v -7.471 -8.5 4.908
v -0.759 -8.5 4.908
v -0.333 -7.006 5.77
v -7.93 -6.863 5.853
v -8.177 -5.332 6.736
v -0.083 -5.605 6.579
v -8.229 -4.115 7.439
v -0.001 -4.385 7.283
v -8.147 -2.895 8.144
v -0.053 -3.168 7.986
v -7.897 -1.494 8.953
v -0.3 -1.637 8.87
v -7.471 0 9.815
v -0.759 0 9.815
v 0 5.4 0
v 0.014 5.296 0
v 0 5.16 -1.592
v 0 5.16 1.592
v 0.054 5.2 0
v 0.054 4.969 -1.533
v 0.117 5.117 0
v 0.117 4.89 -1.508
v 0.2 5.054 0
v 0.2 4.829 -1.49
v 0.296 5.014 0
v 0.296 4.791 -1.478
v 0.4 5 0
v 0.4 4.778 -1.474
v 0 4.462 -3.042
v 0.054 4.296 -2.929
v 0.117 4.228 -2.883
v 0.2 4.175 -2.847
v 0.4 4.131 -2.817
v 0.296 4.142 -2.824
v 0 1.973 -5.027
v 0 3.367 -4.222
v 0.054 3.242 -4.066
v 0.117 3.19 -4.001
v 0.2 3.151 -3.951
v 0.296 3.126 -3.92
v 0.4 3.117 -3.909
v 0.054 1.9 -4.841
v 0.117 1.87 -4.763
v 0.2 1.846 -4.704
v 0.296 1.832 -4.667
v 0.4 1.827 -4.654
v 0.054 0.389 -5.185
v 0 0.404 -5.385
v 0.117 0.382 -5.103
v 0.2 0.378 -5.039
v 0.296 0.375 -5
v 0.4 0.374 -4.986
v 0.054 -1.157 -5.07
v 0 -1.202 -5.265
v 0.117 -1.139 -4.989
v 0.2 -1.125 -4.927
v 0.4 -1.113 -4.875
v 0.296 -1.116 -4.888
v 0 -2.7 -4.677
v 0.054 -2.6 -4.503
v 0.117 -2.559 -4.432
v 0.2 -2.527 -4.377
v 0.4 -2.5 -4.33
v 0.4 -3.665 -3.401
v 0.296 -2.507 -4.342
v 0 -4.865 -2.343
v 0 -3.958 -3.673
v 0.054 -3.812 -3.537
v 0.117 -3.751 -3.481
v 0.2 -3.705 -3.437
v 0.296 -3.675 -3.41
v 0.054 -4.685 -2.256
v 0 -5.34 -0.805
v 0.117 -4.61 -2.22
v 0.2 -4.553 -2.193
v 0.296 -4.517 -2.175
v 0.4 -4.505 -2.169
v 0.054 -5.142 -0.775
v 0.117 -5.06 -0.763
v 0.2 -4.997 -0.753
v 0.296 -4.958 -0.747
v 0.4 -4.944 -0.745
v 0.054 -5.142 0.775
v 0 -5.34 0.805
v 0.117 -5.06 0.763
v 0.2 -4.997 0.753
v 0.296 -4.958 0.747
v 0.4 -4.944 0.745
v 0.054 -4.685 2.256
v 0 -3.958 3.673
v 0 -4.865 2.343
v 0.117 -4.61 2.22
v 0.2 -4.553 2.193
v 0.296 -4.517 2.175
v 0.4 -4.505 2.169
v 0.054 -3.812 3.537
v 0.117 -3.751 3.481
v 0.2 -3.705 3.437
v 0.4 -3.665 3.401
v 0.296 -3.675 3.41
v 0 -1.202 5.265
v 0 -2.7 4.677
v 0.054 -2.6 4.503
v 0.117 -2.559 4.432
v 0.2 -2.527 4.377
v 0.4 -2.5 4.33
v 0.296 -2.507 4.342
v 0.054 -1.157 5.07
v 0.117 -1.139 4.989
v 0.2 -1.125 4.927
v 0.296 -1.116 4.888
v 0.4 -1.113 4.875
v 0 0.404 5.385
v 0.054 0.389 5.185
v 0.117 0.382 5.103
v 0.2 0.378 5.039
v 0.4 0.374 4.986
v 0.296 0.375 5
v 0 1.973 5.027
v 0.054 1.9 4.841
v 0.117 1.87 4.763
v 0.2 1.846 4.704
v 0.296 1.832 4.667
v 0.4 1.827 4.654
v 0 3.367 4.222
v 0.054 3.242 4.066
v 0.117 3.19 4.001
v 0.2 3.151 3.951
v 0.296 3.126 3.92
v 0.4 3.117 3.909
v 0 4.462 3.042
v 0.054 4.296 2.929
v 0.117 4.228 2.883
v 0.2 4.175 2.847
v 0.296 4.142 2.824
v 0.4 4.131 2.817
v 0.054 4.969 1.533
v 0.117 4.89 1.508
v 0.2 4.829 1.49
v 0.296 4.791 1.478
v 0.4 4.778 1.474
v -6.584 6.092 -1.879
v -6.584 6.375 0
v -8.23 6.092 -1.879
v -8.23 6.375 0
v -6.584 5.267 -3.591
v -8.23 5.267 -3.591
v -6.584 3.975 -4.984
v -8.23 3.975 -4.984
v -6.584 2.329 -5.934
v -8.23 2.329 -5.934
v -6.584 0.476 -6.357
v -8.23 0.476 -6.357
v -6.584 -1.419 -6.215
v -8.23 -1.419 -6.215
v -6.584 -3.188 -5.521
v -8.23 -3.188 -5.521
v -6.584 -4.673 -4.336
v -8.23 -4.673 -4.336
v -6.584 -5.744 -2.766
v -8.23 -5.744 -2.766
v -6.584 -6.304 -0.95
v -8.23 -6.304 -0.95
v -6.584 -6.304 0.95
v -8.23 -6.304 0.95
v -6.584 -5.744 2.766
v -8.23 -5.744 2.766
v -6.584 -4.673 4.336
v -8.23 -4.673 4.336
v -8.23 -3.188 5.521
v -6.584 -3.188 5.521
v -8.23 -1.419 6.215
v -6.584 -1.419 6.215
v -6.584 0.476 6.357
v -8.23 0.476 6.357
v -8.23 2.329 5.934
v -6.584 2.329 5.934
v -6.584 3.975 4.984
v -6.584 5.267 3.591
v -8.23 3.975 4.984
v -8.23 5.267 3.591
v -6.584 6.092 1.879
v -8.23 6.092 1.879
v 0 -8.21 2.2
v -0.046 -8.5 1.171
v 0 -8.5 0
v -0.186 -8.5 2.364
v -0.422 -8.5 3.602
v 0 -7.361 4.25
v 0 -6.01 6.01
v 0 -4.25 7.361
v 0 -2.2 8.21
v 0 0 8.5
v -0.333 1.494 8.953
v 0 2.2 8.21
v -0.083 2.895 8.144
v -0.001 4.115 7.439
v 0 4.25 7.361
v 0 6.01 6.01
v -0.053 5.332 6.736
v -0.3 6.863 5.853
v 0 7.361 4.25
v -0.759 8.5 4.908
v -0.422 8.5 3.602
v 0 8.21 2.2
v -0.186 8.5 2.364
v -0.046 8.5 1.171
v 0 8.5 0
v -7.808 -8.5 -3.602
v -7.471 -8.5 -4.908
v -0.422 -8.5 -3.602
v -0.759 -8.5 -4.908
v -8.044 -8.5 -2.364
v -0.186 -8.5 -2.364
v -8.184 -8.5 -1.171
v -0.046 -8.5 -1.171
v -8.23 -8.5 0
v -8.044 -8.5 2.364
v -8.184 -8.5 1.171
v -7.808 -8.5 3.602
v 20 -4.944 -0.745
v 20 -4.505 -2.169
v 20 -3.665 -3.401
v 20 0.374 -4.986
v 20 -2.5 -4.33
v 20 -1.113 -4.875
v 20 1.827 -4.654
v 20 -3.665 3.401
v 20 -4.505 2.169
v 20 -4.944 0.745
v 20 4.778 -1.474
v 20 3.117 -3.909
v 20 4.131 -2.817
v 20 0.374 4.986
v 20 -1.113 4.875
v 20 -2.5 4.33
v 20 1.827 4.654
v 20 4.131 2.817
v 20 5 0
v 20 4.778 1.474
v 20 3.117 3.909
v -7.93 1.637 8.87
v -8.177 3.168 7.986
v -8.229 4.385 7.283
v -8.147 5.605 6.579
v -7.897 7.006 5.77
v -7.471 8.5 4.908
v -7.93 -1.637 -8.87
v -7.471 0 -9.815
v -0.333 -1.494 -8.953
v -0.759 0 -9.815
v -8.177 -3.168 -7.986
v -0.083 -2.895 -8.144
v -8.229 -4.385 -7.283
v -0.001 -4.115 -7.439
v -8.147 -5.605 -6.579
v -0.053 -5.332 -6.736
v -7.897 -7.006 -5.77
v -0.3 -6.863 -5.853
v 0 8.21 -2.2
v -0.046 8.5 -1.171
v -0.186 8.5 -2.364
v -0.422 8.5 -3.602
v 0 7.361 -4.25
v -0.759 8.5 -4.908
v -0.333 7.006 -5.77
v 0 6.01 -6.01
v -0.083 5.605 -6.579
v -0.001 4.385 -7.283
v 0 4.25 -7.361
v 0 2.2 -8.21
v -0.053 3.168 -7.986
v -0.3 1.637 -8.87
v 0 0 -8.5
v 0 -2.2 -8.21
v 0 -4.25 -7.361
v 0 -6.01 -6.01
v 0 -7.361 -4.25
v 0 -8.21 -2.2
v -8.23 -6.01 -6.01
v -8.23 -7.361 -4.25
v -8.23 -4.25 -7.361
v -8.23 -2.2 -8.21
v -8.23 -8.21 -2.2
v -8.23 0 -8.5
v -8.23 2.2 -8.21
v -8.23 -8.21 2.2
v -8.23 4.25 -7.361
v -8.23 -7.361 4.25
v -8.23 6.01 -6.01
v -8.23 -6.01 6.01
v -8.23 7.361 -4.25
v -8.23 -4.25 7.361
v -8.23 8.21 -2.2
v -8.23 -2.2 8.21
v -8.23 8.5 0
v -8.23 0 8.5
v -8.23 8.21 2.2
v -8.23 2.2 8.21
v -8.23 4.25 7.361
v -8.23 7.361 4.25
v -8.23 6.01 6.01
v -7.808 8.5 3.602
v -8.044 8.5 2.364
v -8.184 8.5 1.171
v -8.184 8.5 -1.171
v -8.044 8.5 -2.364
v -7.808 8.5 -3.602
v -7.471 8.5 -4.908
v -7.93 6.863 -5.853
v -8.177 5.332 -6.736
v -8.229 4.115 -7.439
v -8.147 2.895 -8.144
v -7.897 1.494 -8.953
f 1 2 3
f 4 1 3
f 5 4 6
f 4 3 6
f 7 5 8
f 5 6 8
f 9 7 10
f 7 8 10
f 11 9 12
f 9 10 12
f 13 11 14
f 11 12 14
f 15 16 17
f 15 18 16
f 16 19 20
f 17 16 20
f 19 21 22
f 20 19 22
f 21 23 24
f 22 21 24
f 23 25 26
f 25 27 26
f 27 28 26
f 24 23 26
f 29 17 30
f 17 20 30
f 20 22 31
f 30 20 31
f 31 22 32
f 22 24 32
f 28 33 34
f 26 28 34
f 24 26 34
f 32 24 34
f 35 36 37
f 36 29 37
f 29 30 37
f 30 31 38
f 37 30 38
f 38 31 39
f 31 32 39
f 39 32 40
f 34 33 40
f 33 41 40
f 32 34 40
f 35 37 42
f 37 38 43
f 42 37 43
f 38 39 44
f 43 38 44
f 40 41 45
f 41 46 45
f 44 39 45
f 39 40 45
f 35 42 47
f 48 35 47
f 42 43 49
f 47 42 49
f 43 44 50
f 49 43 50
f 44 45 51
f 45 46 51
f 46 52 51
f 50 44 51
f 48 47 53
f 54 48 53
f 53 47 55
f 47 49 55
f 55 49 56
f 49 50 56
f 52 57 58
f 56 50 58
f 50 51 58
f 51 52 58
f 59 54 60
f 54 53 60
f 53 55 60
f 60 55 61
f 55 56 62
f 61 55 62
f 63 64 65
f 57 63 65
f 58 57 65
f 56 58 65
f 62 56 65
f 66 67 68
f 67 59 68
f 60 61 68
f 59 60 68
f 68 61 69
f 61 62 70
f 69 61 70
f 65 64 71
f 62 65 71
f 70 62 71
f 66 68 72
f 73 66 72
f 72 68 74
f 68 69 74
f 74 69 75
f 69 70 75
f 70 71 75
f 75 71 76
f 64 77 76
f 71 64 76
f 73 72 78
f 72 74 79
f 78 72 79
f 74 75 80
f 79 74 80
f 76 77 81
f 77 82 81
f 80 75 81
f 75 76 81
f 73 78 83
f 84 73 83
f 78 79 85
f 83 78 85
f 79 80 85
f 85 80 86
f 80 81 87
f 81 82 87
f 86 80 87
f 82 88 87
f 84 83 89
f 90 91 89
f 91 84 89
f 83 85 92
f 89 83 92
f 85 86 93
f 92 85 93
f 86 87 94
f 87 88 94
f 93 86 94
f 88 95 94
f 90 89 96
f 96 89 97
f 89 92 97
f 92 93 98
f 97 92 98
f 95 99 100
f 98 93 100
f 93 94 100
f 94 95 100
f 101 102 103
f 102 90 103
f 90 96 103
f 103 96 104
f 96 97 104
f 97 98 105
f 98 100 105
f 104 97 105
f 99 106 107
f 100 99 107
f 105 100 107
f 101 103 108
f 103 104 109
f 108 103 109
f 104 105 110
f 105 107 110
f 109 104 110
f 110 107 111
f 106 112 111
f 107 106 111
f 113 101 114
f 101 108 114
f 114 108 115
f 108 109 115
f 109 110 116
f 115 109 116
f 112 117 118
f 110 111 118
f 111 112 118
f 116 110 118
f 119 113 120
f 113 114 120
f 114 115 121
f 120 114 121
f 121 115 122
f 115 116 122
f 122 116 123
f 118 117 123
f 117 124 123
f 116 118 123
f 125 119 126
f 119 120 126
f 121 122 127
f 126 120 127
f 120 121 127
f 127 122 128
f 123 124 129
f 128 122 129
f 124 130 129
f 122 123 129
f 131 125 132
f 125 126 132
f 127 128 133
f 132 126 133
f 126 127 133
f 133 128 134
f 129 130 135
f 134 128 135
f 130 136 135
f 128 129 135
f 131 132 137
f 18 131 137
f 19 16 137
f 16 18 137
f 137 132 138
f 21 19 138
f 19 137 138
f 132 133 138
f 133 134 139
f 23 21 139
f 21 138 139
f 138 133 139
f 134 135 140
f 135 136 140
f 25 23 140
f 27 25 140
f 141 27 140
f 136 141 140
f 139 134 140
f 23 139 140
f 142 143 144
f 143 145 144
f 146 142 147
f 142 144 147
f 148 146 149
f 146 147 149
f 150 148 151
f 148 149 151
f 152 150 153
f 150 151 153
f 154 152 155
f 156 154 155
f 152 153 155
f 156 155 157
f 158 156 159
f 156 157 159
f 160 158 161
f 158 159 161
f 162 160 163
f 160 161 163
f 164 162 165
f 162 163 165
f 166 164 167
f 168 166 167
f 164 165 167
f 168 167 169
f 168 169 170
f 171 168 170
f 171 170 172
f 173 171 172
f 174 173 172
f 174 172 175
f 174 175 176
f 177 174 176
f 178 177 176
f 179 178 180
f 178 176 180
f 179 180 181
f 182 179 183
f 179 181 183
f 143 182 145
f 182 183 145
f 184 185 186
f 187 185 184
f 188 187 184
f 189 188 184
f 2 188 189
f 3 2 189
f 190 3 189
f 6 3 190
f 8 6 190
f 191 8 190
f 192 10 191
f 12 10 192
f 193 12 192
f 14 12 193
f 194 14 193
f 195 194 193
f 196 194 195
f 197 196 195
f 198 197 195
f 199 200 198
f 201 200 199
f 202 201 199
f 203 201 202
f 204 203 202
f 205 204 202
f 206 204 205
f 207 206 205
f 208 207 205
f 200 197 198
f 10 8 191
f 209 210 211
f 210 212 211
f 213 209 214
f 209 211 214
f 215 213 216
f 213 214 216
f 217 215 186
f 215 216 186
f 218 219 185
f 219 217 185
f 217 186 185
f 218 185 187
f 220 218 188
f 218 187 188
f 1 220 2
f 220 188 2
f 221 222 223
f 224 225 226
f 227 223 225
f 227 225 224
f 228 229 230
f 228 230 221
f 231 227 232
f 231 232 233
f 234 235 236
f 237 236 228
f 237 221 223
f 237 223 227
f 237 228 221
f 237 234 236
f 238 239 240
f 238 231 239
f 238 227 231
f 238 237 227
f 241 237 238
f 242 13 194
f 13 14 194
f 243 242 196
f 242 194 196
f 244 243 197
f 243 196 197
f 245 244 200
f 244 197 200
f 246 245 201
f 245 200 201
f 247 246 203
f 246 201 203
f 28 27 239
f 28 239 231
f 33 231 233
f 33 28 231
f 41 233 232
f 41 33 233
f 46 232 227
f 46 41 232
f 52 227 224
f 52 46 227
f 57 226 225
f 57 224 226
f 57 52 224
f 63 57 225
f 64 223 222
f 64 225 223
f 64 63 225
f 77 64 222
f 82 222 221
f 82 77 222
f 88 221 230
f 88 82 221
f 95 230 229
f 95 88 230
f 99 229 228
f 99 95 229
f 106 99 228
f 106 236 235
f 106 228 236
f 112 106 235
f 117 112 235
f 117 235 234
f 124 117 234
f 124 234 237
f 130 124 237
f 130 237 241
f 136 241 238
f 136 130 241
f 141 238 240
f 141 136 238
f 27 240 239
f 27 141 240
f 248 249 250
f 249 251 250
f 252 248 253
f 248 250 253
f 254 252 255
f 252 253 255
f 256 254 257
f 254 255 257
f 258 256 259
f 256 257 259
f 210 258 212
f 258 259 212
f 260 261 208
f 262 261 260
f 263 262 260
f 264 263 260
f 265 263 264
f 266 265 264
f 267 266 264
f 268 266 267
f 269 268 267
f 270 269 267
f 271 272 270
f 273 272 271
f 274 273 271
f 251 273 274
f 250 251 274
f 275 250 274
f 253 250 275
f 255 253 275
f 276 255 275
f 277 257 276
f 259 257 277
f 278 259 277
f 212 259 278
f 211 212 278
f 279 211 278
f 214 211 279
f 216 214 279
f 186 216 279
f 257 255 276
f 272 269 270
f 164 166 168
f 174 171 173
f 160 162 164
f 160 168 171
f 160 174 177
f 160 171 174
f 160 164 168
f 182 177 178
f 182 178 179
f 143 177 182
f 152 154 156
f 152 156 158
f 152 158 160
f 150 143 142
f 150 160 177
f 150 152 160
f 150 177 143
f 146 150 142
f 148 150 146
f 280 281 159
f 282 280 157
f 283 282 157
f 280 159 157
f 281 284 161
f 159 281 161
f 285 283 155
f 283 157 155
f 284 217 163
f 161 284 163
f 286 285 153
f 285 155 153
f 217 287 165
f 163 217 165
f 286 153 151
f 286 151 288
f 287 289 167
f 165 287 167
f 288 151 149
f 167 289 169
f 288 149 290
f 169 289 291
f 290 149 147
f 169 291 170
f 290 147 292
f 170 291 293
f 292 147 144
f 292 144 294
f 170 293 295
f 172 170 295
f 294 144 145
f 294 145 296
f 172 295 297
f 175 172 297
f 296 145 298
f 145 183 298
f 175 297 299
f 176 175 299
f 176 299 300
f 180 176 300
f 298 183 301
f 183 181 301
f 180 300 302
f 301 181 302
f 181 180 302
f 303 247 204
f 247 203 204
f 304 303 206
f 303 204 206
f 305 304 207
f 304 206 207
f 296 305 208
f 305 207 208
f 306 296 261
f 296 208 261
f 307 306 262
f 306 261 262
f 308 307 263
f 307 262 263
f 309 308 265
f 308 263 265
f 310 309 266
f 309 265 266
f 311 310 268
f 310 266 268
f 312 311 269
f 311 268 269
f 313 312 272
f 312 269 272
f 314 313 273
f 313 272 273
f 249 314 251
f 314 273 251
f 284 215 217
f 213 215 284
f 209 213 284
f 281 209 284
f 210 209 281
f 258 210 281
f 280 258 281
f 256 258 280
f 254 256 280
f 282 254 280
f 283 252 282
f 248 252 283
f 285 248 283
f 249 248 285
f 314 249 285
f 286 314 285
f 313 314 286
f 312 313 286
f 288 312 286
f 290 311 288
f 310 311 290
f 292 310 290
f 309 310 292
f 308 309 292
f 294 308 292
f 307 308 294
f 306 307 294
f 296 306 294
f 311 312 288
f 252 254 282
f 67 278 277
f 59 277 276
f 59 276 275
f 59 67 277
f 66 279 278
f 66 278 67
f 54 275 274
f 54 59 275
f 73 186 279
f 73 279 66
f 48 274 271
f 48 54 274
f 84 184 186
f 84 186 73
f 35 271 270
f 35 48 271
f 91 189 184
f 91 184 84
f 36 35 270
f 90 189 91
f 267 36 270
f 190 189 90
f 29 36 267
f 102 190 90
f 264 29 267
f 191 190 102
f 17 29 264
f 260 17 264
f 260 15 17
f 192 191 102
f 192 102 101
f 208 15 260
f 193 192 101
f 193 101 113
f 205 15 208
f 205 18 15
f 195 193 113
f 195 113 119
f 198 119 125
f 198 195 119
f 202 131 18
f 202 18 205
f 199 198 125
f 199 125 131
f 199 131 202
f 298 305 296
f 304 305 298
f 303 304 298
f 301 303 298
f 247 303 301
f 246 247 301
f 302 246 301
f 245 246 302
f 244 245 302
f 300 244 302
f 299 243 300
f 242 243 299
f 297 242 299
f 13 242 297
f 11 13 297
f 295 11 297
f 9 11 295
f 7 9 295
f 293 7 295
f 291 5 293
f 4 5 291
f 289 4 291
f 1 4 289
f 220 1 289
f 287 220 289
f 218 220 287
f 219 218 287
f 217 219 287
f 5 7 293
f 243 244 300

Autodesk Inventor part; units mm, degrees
ref_plane "YZ Plane" through (0, 0, 0) normal (1, 0, 0) x (0, 1, 0)
ref_plane "XZ Plane" through (0, 0, 0) normal (0, 1, 0) x (-1, 0, 0)
sketch "Sketch1" plane through (0, 0, 0) normal (0, 0, 1) x (1, 0, 0)
  line L0 (0, 5) -> (0, 0)
  line L1 (0, 0) -> (20, 0)
  line L2 (20, 0) -> (20, 5)
  line L3 (20, 5) -> (0, 5)
  line L4 (-4, 0) -> (24, 0) projected
  line L5 (0, -1) -> (0, 6) projected
  dimension "d0" = 10
  dimension "d1" = 20
revolve "Body" add sketch "Sketch1" angle 360 about axis through (0, 0, 0) along (1, 0, 0)
sketch "Sketch2" plane through (0, 0, 0) normal (1, 0, 0) x (0, 1, 0)
  line L0 (0, 9.815) -> (8.5, 4.9075)
  line L1 (8.5, 4.9075) -> (8.5, -4.9075)
  line L2 (8.5, -4.9075) -> (0, -9.815)
  line L3 (0, -9.815) -> (-8.5, -4.9075)
  line L4 (-8.5, -4.9075) -> (-8.5, 4.9075)
  line L5 (-8.5, 4.9075) -> (0, 9.815)
  line L6 (-11.9, 0) -> (11.9, 0) projected
  line L7 (0, -13.7409) -> (0, 13.7409) projected
  point P0 (0, 0)
  point P1 (0, 0)
  dimension "d2" = 17
extrude "Head" add sketch "Sketch2" against normal blind 8.23
sketch "Sketch3" plane through (-8.23, 0, 0) normal (-1, 0, 0) x (0, 1, 0)
  circle A0 centre (0, 0) radius 6.375
  point P0 (0, 0)
  dimension "d12" = 12.75
extrude "Indent1" cut sketch "Sketch3" against normal blind 1.646
sketch "Sketch4" plane through (0, 0, 0) normal (0, 0, 1) x (1, 0, 0)
  line L0 (-8.23, 9.815) -> (-8.23, 8.5)
  line L1 (-8.23, 8.5) -> (-7.4708, 9.815)
  line L2 (-7.4708, 9.815) -> (-8.23, 9.815)
  line L3 (0, 9.815) -> (0, 8.5)
  line L4 (0, 8.5) -> (-0.7592, 9.815)
  line L5 (-0.7592, 9.815) -> (0, 9.815)
  line L6 (0, 0) -> (-8.23, 0) projected
  line L7 (-8.23, 0) -> (-8.23, 8.5) projected
  line L8 (0, 0) -> (0, 8.5) projected
  line L9 (-9.876, 0) -> (1.646, 0) projected
  line L10 (-7.4708, 9.815) -> (-0.7592, 9.815) construction
  line L11 (0, -1.963) -> (0, 11.7779) projected
  dimension "d6" = 30
  dimension "d7" = 30
  dimension "d16" = 17
  dimension "d17" = 17
  dimension "d18" = 19.6299
revolve "Chamfer1" cut sketch "Sketch4" angle 360 about axis through (-10, 0, 0) along (1, 0, 0)
fillet "Fillet1" radius 0.4 1 edges at (0, -5, 0)
thread "Thread" size "M10x1.5" class "6g" standard "ISO Metric profile" length 17
ref_plane "Work Plane1" through (3, 0, 0) normal (0, 0.5, 0.866) x (1, 0, 0)
equation "\"d0\" = GD"
equation "\"d1\" = NLG"
equation "\"d2\" = SW"
equation "\"d3\" = KOH"
equation "\"d12\" = 0.75 * SW0"
equation "\"d14\" = 0.2 * KOH"
equation "\"d6\" = ANG1"
equation "\"d7\" = ANG1"
equation "\"d16\" = SW0"
equation "\"d17\" = SW0"
equation "\"d18\" = 1.1547 * SW"
equation "\"d11\" = RR"
equation "\"d8\" = GEL"
equation "\"NLG\" = 20"
equation "\"KOH\" = 8.23"
equation "\"GD\" = NND"
equation "\"GEL\" = 17"
equation "\"SW\" = 17"
equation "\"SW0\" = SW"
equation "\"ANG1\" = 30deg"
equation "\"RR\" = 0.4"
equation "\"GUL\" = 0.61345 * PTC"
equation "\"SPD\" = NND - 1.2269 * PTC"
equation "\"GD1\" = THREADDIA - 1.2269 * PTC"
equation "\"SDH\" = 11.2"
equation "\"TOA\" = 30deg"
equation "\"FAWI\" = 45deg"
equation "\"PTC\" = 1.5"
equation "\"GAL\" = 0.61345 * PTC"
equation "\"SD\" = 0"
equation "\"SD2\" = SDH"
equation "\"E0\" = 1.155 * SW"
equation "\"NND\" = 10"
equation "\"THREADDIA\" = 10"
properties part number "AS 1427 - M10 x 20" material "Steel, Mild"
